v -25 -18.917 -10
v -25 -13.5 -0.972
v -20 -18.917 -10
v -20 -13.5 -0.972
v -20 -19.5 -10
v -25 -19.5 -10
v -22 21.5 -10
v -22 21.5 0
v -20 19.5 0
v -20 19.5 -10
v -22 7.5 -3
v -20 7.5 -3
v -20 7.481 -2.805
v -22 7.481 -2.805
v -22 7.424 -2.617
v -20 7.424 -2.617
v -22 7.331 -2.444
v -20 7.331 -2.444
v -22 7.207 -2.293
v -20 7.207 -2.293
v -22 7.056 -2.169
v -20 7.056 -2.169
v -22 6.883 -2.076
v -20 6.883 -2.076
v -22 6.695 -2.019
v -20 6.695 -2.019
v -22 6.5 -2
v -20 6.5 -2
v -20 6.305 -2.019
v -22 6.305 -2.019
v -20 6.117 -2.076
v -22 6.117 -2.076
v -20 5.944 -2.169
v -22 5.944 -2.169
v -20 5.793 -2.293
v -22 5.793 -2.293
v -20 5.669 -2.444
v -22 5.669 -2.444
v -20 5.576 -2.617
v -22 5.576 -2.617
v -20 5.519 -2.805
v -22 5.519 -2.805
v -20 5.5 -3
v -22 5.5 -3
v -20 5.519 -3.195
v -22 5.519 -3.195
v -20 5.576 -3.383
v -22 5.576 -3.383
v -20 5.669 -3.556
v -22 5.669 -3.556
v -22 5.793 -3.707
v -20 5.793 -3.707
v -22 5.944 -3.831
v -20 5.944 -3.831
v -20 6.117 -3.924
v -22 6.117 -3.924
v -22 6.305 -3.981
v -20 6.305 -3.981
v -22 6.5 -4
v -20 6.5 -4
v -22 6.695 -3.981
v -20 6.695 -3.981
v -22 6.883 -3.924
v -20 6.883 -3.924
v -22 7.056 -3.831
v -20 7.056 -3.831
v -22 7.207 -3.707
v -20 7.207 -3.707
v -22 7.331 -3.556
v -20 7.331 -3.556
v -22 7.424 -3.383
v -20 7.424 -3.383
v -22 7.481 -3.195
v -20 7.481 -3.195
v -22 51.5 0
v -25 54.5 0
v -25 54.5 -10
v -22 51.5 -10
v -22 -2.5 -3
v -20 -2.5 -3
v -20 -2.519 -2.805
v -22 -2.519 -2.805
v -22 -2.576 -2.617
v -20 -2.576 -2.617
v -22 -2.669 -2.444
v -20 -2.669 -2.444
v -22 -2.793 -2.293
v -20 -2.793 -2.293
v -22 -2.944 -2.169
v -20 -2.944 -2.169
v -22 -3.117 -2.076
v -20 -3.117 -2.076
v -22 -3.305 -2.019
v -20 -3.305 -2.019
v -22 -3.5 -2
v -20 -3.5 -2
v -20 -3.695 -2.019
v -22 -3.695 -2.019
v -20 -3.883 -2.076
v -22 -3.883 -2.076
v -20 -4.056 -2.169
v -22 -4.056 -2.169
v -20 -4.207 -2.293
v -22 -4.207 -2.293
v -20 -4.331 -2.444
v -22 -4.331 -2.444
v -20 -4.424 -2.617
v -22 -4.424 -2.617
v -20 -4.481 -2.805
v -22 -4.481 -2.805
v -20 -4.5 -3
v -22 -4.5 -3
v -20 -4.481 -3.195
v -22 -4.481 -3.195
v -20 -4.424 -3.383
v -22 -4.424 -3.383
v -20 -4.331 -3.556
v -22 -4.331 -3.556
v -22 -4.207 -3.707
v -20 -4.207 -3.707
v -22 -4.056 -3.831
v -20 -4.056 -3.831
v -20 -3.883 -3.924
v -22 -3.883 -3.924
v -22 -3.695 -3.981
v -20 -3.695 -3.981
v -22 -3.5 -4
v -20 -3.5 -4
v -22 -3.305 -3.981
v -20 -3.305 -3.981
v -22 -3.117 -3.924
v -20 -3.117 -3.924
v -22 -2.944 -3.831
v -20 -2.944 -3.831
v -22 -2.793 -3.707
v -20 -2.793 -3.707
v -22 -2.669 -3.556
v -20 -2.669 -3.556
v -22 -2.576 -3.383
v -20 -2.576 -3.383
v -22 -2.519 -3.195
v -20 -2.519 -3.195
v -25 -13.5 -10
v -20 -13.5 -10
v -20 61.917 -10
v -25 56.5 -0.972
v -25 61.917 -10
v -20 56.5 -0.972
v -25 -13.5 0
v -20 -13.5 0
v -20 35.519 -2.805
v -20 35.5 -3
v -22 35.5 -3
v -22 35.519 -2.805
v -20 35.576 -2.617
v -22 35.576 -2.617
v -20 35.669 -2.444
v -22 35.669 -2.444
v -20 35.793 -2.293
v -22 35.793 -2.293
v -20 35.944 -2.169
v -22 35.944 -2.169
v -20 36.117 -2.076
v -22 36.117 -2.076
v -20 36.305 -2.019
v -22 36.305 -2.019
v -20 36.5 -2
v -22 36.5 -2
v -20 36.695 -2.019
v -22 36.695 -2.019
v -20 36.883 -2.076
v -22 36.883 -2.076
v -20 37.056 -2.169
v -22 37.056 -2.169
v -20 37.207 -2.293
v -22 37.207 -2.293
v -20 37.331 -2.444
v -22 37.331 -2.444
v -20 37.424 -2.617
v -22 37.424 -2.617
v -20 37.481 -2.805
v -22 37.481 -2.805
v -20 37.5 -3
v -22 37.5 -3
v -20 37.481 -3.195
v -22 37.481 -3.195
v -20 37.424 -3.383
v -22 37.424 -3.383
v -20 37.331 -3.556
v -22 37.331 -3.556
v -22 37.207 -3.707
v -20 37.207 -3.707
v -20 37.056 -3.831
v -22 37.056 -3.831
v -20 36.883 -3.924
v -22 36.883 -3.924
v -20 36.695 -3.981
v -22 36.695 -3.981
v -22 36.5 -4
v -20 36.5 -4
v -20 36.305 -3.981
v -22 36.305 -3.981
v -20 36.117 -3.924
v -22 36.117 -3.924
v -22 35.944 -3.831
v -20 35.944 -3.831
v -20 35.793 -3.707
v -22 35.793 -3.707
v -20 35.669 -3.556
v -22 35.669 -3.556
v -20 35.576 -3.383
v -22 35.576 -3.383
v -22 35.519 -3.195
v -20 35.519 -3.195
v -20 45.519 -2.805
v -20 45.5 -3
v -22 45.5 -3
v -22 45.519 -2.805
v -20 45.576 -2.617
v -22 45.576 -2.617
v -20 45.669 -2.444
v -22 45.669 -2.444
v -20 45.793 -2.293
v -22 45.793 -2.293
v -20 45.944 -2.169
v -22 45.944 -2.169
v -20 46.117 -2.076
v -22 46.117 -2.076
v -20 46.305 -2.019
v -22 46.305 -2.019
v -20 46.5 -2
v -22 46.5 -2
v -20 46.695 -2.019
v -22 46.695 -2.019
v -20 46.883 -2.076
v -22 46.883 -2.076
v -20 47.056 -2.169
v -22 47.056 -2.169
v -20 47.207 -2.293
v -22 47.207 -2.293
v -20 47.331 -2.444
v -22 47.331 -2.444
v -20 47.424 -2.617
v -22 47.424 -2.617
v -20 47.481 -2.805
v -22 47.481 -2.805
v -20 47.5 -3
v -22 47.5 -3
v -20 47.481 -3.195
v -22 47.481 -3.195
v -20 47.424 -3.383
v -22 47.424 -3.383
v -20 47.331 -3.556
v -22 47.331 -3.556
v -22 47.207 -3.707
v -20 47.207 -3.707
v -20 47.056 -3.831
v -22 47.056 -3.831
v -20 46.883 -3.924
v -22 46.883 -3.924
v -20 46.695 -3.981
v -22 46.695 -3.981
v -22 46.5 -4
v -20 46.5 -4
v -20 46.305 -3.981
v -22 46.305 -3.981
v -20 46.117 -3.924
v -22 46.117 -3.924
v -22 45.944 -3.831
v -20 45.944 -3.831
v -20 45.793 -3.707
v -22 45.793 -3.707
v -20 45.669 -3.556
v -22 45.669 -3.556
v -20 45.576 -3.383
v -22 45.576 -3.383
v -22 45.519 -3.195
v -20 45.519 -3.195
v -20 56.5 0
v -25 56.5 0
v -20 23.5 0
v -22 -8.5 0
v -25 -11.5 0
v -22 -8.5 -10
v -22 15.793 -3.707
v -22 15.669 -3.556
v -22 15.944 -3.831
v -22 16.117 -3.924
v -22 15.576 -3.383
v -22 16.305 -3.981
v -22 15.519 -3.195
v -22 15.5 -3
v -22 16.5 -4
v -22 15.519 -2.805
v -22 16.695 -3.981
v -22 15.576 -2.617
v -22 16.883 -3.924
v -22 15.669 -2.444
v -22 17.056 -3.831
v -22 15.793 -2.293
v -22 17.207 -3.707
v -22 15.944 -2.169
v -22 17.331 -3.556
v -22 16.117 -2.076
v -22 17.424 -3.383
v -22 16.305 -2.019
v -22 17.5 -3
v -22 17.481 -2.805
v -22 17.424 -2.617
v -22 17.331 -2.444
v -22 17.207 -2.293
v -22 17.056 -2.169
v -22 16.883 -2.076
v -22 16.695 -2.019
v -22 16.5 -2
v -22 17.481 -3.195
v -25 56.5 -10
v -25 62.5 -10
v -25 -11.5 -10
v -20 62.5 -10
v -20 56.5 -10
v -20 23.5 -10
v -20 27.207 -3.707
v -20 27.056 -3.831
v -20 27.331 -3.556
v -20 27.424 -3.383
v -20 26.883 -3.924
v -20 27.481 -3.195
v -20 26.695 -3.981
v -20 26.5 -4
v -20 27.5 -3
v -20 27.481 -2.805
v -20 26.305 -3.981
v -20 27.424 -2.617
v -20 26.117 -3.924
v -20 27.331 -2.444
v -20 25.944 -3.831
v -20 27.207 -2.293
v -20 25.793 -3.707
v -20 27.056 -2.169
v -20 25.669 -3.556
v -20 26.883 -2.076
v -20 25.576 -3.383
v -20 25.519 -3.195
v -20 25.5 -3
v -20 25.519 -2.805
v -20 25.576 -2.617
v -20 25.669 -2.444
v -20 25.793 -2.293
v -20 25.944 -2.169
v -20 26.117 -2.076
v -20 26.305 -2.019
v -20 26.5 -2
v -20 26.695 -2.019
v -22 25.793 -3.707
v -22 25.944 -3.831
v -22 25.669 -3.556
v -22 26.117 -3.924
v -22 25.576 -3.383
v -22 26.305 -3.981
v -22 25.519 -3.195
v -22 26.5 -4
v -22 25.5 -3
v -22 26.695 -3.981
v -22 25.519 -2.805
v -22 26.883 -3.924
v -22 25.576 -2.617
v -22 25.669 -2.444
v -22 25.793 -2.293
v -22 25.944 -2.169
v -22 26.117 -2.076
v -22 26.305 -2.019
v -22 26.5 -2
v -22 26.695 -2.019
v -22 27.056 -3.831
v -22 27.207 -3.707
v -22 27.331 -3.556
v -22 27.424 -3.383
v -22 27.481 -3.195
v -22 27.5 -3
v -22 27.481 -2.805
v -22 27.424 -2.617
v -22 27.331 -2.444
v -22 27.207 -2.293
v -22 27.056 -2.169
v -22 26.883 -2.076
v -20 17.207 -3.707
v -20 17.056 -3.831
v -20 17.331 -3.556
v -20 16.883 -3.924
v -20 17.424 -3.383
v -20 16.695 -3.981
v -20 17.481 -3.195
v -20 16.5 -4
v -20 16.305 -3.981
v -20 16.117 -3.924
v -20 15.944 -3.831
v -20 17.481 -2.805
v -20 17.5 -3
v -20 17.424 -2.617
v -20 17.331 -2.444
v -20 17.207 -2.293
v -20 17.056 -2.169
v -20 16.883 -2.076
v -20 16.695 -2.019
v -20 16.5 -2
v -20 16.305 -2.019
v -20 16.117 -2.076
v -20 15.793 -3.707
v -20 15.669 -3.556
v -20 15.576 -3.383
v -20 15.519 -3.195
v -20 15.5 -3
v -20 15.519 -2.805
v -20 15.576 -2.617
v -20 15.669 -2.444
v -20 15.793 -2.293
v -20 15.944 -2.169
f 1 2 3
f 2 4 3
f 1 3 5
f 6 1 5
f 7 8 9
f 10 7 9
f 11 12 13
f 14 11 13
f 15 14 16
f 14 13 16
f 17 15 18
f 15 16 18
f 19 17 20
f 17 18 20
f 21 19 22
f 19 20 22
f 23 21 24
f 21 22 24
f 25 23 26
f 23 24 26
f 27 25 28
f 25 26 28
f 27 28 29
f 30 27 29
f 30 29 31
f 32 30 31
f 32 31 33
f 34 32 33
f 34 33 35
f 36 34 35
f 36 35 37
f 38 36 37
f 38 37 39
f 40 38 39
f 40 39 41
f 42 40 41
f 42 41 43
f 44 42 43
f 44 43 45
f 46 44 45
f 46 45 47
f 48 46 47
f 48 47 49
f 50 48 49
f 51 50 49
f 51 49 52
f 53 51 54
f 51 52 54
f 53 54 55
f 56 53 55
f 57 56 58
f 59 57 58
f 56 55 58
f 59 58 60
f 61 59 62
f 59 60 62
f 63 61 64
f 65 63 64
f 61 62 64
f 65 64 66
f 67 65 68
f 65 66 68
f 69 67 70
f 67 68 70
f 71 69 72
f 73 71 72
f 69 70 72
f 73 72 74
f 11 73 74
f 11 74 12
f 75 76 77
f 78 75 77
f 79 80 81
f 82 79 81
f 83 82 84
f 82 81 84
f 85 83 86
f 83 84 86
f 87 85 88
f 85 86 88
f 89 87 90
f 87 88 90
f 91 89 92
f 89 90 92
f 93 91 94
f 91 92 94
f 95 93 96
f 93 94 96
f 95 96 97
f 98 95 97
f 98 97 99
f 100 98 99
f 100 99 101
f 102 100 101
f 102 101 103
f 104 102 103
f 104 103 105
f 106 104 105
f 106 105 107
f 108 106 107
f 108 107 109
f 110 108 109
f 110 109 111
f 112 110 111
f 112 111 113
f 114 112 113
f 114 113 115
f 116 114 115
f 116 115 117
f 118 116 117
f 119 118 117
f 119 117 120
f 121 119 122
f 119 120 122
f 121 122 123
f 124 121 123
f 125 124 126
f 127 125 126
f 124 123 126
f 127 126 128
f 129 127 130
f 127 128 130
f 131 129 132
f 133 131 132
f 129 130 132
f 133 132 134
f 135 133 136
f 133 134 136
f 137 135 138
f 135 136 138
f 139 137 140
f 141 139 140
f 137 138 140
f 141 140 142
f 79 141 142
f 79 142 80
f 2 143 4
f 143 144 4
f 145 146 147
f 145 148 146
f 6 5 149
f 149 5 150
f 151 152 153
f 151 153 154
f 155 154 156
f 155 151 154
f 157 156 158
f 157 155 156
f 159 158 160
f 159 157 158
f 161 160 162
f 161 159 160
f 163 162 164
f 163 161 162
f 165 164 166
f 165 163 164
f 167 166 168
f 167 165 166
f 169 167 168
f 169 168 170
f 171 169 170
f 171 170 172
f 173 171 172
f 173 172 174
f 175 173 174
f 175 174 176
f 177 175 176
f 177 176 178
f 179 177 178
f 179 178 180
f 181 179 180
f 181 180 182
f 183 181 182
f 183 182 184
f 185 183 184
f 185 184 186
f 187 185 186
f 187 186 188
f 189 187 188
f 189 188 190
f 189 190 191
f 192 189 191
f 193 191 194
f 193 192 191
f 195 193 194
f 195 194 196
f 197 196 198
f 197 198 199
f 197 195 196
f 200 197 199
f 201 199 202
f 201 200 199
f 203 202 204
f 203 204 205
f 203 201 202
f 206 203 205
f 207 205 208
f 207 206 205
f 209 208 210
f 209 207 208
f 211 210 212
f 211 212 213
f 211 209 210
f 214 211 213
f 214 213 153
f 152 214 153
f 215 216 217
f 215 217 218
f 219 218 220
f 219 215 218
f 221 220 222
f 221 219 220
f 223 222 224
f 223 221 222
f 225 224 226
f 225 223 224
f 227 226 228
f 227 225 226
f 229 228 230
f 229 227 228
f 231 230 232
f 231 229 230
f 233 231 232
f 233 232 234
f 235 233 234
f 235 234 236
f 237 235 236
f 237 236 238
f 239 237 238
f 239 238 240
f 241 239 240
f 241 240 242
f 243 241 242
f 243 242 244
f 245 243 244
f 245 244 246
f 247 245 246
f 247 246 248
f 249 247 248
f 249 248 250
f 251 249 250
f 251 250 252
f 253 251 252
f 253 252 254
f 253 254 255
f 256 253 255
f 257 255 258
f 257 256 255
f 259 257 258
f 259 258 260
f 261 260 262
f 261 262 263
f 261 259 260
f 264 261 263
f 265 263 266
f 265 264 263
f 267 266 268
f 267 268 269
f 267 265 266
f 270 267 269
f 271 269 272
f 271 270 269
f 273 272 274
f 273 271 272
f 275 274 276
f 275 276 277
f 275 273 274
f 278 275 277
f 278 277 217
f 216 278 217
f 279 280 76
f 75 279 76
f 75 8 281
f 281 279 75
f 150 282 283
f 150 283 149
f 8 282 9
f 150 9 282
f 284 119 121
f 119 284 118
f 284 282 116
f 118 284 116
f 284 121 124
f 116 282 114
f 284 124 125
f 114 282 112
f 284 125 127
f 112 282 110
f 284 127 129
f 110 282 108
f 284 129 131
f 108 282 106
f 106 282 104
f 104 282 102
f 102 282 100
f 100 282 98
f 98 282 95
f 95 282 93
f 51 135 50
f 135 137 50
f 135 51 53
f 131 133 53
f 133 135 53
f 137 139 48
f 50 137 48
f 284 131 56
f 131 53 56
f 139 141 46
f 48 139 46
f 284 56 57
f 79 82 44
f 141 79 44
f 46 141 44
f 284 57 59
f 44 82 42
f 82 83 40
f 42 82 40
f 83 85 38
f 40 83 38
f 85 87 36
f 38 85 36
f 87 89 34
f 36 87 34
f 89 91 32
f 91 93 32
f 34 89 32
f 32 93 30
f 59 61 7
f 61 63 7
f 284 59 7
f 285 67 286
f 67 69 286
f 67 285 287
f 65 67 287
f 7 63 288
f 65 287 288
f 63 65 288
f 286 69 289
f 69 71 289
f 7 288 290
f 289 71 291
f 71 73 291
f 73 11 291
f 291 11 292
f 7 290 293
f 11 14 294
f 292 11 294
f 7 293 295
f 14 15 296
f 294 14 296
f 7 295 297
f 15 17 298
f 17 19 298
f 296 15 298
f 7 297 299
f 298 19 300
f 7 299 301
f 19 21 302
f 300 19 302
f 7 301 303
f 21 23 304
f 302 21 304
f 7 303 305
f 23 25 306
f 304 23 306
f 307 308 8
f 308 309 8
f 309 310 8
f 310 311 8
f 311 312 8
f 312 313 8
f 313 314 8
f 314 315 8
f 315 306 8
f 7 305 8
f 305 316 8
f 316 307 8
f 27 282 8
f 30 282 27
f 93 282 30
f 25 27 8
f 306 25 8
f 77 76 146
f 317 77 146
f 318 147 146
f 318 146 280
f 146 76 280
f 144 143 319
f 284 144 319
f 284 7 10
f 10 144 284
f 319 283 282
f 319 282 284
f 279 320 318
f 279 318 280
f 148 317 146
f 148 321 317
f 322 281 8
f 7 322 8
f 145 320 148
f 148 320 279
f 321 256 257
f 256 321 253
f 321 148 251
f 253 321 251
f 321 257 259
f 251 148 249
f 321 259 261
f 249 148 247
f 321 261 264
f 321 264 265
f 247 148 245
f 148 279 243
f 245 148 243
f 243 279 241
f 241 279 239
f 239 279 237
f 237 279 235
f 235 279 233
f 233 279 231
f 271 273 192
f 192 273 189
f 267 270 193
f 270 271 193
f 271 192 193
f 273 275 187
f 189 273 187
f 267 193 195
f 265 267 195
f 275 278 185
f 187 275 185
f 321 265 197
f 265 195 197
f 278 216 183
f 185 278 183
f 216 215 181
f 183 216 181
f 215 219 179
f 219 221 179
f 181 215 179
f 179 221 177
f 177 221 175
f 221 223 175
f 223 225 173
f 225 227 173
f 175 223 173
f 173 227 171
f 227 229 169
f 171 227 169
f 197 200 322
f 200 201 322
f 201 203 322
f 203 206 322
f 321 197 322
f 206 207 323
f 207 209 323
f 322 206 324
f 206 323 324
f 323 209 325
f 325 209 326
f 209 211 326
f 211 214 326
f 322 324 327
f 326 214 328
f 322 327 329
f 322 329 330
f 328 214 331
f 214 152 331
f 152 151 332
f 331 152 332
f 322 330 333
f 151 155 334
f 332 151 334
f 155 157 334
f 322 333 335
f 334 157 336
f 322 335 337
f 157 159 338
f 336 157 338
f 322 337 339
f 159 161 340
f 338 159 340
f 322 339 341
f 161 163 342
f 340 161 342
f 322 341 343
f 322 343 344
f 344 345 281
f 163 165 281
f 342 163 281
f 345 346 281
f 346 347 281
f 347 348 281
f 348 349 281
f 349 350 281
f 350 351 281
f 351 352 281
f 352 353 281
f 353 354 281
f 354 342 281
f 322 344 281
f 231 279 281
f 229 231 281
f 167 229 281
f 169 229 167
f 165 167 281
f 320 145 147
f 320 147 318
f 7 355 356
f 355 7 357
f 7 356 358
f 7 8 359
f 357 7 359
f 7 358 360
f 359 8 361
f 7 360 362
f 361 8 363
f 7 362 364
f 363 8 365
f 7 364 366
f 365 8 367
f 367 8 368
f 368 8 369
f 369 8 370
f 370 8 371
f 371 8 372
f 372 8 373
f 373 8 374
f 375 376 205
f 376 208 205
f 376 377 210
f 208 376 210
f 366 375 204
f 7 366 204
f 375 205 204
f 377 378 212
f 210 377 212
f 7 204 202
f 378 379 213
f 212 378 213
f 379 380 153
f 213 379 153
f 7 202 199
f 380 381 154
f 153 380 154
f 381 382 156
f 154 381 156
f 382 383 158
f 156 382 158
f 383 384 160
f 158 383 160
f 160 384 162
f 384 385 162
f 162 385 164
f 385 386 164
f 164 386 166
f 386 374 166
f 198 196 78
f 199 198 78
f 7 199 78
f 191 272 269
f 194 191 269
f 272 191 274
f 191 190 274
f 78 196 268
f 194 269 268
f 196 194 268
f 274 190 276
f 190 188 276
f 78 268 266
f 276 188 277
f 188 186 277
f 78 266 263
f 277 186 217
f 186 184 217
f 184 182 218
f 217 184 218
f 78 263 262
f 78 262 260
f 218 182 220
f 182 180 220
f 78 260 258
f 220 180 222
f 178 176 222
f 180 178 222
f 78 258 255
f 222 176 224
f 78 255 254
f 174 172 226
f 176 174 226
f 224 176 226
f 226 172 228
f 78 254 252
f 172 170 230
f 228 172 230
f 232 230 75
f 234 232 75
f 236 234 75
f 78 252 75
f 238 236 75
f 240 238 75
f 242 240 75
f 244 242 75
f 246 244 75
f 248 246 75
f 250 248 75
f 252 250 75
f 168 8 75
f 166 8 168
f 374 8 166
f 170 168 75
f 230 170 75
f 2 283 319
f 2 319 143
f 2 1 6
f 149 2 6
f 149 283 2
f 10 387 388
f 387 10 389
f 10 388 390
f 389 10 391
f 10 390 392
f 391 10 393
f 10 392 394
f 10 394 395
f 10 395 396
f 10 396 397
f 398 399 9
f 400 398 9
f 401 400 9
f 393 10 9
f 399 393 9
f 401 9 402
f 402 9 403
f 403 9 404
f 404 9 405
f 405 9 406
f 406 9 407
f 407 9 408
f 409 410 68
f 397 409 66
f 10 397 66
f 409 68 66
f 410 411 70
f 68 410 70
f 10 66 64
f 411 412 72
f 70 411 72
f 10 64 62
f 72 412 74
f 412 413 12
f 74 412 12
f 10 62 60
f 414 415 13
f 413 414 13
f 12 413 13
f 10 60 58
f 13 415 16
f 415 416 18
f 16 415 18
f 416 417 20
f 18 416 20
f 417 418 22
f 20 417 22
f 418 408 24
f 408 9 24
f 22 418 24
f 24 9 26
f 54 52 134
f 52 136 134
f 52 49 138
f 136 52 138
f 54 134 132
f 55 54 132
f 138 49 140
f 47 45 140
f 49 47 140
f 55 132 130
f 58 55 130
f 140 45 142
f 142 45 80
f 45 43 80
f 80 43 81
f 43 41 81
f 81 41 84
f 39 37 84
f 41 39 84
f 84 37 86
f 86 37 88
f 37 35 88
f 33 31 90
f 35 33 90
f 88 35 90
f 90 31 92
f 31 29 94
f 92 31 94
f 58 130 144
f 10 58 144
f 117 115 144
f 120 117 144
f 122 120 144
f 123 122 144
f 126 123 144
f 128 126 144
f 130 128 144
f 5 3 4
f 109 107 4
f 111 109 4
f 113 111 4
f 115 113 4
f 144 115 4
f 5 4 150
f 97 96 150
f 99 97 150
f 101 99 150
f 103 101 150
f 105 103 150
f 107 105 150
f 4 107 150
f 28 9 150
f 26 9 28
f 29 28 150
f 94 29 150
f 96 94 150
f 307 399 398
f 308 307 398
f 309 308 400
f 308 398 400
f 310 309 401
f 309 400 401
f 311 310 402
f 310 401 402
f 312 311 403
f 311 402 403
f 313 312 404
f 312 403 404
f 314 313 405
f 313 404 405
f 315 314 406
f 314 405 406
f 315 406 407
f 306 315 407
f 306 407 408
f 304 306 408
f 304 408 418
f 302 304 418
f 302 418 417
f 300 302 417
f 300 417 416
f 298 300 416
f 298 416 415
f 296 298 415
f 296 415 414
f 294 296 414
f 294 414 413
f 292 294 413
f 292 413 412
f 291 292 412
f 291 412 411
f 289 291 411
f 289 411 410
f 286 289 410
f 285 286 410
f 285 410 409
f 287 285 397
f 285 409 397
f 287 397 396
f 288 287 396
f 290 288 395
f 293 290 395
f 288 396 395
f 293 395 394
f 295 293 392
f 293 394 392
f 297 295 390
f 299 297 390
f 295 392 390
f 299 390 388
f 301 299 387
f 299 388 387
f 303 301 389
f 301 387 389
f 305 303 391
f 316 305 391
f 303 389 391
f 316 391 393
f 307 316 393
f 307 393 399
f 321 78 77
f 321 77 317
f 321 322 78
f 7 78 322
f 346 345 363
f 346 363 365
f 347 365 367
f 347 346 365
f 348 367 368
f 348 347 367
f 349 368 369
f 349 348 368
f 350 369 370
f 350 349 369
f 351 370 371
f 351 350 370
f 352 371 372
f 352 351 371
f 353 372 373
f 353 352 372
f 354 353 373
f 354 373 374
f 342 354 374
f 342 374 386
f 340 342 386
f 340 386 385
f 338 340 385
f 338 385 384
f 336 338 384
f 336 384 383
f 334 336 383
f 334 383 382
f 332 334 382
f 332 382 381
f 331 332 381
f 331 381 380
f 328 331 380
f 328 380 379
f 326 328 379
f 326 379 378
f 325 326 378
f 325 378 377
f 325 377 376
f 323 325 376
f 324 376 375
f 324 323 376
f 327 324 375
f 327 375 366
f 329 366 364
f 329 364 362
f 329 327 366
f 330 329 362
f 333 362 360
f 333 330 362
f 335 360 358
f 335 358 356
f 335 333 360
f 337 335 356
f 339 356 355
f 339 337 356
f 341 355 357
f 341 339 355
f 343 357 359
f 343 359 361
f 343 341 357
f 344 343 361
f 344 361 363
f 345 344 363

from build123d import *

# Parameters (mm, degrees)
F1_DEPTH  = 10
F2_W      = 2
F2_H      = 10
F3_DEPTH  = 25
F4_DEPTH  = 44.001
F6_DEPTH  = 41.001
F9_DEPTH  = 3
F10_SIZE  = 2.99999
F12_DEPTH = 3
F13_SIZE  = 2.99999
F16_D     = 2
F17_D     = 2
F18_DEPTH = 25
F21_DEPTH = 25


# Not quite as in the source:
# - a fillet or chamfer is up to 0.001 mm smaller than in the source, because OpenCascade refuses the exact size
# - a feature of the source that left no trace in its solid (it failed there, or was rolled back) is left out


with BuildPart() as f1:
    # F0 (on Top) → F1 (new body)
    with BuildSketch(Plane.XY):
        Polygon((-22, -19.5), (-20, -19.5), (-20, 19.5), (20, 19.5), (20, 21.5), (-22, 21.5), align=None)
        Polygon((20, 19.5), (20, -19.5), (-20, -19.5), (-22, -19.5), (-22, -21.5), (22, -21.5), (22, 21.5), (20, 21.5), align=None)
    extrude(amount=-F1_DEPTH)

    # F2 (on face) → F3 (cut)
    with BuildSketch(Plane(origin=(-22, 0, 0), x_dir=(0, -1, 0), z_dir=(-1, 0, 0))):
        Polygon((19.5, 0), (13.5, 0), (19.5, -10), align=None)
        with Locations((20.5, -5)):
            Rectangle(F2_W, F2_H)
        Polygon((13.5, -10), (18.9169048105, -10), (13.5, -0.9718253158), align=None)
    extrude(amount=-F3_DEPTH, mode=Mode.SUBTRACT)

    # F2 (on face) → F4 (cut, through all)
    with BuildSketch(Plane(origin=(-22, 0, 0), x_dir=(0, -1, 0), z_dir=(-1, 0, 0))):
        Polygon((19.5, 0), (13.5, 0), (19.5, -10), align=None)
        with Locations((20.5, -5)):
            Rectangle(F2_W, F2_H)
    extrude(amount=-F4_DEPTH, mode=Mode.SUBTRACT)

    # F5 (on face) → F6 (cut, through all)
    with BuildSketch(Plane(origin=(0, 21.5, 0), x_dir=(-1, 0, 0), z_dir=(0, 1, 0))):
        Polygon((-14, -0.9077913453), (-20, -10), (-14, -10), align=None)
        Polygon((-22, -10), (-20, -10), (-20, -9.0922086547), (-14, 0), (-22, 0), align=None)
    extrude(amount=-F6_DEPTH, mode=Mode.SUBTRACT)

    # F8 (on face) → F9 (join)
    with BuildSketch(Plane(origin=(0, 21.5, 0), x_dir=(-1, 0, 0), z_dir=(0, 1, 0))):
        Polygon((-14, -10), (-9, -10), (-9, 0), (-14, 0), (-20, -9.0922086547), (-20, -10), (-14, -0.9077913453), align=None)
    extrude(amount=F9_DEPTH)

    # F10 (size 3 in the source; OpenCascade refuses exactly that, so slightly less here)
    f10_edges = [f1.edges().sort_by_distance(p)[0] for p in [
        (9, 24.5, -5),
    ]]
    chamfer(f10_edges, length=F10_SIZE)

    # F11 (on face) → F12 (join)
    with BuildSketch(Plane(origin=(-22, 0, 0), x_dir=(0, -1, 0), z_dir=(-1, 0, 0))):
        Polygon((13.5, 0), (8.5, 0), (8.5, -10), (13.5, -10), (13.5, -0.9718253158), (18.9169048105, -10), (19.5, -10), align=None)
    extrude(amount=F12_DEPTH)

    # F13 (size 3 in the source; OpenCascade refuses exactly that, so slightly less here)
    f13_edges = [f1.edges().sort_by_distance(p)[0] for p in [
        (-25, -8.5, -5),
    ]]
    chamfer(f13_edges, length=F13_SIZE)

    # F16 (through all)
    with Locations(Plane(origin=(-22, 0, 0), x_dir=(0, -1, 0), z_dir=(-1, 0, 0))):
        with Locations((-6.5, -3), (3.5, -3), (-16.5, -3)):
            Hole(F16_D / 2)

    # F17 (through all)
    with Locations(Plane(origin=(0, 21.5, 0), x_dir=(-1, 0, 0), z_dir=(0, 1, 0))):
        with Locations((-3.5, -3), (6.5, -3), (16.5, -3)):
            Hole(F17_D / 2)

    # F18 (cut): a face of the model
    f18_faces = [f1.faces().sort_by_distance(p)[0] for p in [
        (-2.5776416517, 19.5, -5.0560962008),
    ]]
    extrude(f18_faces, amount=-F18_DEPTH, mode=Mode.SUBTRACT)

    # F19: F1 across face


with BuildPart() as f1_1:
    add(f1.part)
    add(f1.part.mirror(Plane(origin=(-21, 21.5, -5), x_dir=(-1, 0, 0), z_dir=(0, 1, 0))))

    # F20 (on face) → F21 (cut)
    with BuildSketch(Plane.XY):
        Polygon((-20, 23.5), (-22, 21.5), (-20, 19.5), align=None)
    extrude(amount=-F21_DEPTH, mode=Mode.SUBTRACT)


solid = f1_1.part
